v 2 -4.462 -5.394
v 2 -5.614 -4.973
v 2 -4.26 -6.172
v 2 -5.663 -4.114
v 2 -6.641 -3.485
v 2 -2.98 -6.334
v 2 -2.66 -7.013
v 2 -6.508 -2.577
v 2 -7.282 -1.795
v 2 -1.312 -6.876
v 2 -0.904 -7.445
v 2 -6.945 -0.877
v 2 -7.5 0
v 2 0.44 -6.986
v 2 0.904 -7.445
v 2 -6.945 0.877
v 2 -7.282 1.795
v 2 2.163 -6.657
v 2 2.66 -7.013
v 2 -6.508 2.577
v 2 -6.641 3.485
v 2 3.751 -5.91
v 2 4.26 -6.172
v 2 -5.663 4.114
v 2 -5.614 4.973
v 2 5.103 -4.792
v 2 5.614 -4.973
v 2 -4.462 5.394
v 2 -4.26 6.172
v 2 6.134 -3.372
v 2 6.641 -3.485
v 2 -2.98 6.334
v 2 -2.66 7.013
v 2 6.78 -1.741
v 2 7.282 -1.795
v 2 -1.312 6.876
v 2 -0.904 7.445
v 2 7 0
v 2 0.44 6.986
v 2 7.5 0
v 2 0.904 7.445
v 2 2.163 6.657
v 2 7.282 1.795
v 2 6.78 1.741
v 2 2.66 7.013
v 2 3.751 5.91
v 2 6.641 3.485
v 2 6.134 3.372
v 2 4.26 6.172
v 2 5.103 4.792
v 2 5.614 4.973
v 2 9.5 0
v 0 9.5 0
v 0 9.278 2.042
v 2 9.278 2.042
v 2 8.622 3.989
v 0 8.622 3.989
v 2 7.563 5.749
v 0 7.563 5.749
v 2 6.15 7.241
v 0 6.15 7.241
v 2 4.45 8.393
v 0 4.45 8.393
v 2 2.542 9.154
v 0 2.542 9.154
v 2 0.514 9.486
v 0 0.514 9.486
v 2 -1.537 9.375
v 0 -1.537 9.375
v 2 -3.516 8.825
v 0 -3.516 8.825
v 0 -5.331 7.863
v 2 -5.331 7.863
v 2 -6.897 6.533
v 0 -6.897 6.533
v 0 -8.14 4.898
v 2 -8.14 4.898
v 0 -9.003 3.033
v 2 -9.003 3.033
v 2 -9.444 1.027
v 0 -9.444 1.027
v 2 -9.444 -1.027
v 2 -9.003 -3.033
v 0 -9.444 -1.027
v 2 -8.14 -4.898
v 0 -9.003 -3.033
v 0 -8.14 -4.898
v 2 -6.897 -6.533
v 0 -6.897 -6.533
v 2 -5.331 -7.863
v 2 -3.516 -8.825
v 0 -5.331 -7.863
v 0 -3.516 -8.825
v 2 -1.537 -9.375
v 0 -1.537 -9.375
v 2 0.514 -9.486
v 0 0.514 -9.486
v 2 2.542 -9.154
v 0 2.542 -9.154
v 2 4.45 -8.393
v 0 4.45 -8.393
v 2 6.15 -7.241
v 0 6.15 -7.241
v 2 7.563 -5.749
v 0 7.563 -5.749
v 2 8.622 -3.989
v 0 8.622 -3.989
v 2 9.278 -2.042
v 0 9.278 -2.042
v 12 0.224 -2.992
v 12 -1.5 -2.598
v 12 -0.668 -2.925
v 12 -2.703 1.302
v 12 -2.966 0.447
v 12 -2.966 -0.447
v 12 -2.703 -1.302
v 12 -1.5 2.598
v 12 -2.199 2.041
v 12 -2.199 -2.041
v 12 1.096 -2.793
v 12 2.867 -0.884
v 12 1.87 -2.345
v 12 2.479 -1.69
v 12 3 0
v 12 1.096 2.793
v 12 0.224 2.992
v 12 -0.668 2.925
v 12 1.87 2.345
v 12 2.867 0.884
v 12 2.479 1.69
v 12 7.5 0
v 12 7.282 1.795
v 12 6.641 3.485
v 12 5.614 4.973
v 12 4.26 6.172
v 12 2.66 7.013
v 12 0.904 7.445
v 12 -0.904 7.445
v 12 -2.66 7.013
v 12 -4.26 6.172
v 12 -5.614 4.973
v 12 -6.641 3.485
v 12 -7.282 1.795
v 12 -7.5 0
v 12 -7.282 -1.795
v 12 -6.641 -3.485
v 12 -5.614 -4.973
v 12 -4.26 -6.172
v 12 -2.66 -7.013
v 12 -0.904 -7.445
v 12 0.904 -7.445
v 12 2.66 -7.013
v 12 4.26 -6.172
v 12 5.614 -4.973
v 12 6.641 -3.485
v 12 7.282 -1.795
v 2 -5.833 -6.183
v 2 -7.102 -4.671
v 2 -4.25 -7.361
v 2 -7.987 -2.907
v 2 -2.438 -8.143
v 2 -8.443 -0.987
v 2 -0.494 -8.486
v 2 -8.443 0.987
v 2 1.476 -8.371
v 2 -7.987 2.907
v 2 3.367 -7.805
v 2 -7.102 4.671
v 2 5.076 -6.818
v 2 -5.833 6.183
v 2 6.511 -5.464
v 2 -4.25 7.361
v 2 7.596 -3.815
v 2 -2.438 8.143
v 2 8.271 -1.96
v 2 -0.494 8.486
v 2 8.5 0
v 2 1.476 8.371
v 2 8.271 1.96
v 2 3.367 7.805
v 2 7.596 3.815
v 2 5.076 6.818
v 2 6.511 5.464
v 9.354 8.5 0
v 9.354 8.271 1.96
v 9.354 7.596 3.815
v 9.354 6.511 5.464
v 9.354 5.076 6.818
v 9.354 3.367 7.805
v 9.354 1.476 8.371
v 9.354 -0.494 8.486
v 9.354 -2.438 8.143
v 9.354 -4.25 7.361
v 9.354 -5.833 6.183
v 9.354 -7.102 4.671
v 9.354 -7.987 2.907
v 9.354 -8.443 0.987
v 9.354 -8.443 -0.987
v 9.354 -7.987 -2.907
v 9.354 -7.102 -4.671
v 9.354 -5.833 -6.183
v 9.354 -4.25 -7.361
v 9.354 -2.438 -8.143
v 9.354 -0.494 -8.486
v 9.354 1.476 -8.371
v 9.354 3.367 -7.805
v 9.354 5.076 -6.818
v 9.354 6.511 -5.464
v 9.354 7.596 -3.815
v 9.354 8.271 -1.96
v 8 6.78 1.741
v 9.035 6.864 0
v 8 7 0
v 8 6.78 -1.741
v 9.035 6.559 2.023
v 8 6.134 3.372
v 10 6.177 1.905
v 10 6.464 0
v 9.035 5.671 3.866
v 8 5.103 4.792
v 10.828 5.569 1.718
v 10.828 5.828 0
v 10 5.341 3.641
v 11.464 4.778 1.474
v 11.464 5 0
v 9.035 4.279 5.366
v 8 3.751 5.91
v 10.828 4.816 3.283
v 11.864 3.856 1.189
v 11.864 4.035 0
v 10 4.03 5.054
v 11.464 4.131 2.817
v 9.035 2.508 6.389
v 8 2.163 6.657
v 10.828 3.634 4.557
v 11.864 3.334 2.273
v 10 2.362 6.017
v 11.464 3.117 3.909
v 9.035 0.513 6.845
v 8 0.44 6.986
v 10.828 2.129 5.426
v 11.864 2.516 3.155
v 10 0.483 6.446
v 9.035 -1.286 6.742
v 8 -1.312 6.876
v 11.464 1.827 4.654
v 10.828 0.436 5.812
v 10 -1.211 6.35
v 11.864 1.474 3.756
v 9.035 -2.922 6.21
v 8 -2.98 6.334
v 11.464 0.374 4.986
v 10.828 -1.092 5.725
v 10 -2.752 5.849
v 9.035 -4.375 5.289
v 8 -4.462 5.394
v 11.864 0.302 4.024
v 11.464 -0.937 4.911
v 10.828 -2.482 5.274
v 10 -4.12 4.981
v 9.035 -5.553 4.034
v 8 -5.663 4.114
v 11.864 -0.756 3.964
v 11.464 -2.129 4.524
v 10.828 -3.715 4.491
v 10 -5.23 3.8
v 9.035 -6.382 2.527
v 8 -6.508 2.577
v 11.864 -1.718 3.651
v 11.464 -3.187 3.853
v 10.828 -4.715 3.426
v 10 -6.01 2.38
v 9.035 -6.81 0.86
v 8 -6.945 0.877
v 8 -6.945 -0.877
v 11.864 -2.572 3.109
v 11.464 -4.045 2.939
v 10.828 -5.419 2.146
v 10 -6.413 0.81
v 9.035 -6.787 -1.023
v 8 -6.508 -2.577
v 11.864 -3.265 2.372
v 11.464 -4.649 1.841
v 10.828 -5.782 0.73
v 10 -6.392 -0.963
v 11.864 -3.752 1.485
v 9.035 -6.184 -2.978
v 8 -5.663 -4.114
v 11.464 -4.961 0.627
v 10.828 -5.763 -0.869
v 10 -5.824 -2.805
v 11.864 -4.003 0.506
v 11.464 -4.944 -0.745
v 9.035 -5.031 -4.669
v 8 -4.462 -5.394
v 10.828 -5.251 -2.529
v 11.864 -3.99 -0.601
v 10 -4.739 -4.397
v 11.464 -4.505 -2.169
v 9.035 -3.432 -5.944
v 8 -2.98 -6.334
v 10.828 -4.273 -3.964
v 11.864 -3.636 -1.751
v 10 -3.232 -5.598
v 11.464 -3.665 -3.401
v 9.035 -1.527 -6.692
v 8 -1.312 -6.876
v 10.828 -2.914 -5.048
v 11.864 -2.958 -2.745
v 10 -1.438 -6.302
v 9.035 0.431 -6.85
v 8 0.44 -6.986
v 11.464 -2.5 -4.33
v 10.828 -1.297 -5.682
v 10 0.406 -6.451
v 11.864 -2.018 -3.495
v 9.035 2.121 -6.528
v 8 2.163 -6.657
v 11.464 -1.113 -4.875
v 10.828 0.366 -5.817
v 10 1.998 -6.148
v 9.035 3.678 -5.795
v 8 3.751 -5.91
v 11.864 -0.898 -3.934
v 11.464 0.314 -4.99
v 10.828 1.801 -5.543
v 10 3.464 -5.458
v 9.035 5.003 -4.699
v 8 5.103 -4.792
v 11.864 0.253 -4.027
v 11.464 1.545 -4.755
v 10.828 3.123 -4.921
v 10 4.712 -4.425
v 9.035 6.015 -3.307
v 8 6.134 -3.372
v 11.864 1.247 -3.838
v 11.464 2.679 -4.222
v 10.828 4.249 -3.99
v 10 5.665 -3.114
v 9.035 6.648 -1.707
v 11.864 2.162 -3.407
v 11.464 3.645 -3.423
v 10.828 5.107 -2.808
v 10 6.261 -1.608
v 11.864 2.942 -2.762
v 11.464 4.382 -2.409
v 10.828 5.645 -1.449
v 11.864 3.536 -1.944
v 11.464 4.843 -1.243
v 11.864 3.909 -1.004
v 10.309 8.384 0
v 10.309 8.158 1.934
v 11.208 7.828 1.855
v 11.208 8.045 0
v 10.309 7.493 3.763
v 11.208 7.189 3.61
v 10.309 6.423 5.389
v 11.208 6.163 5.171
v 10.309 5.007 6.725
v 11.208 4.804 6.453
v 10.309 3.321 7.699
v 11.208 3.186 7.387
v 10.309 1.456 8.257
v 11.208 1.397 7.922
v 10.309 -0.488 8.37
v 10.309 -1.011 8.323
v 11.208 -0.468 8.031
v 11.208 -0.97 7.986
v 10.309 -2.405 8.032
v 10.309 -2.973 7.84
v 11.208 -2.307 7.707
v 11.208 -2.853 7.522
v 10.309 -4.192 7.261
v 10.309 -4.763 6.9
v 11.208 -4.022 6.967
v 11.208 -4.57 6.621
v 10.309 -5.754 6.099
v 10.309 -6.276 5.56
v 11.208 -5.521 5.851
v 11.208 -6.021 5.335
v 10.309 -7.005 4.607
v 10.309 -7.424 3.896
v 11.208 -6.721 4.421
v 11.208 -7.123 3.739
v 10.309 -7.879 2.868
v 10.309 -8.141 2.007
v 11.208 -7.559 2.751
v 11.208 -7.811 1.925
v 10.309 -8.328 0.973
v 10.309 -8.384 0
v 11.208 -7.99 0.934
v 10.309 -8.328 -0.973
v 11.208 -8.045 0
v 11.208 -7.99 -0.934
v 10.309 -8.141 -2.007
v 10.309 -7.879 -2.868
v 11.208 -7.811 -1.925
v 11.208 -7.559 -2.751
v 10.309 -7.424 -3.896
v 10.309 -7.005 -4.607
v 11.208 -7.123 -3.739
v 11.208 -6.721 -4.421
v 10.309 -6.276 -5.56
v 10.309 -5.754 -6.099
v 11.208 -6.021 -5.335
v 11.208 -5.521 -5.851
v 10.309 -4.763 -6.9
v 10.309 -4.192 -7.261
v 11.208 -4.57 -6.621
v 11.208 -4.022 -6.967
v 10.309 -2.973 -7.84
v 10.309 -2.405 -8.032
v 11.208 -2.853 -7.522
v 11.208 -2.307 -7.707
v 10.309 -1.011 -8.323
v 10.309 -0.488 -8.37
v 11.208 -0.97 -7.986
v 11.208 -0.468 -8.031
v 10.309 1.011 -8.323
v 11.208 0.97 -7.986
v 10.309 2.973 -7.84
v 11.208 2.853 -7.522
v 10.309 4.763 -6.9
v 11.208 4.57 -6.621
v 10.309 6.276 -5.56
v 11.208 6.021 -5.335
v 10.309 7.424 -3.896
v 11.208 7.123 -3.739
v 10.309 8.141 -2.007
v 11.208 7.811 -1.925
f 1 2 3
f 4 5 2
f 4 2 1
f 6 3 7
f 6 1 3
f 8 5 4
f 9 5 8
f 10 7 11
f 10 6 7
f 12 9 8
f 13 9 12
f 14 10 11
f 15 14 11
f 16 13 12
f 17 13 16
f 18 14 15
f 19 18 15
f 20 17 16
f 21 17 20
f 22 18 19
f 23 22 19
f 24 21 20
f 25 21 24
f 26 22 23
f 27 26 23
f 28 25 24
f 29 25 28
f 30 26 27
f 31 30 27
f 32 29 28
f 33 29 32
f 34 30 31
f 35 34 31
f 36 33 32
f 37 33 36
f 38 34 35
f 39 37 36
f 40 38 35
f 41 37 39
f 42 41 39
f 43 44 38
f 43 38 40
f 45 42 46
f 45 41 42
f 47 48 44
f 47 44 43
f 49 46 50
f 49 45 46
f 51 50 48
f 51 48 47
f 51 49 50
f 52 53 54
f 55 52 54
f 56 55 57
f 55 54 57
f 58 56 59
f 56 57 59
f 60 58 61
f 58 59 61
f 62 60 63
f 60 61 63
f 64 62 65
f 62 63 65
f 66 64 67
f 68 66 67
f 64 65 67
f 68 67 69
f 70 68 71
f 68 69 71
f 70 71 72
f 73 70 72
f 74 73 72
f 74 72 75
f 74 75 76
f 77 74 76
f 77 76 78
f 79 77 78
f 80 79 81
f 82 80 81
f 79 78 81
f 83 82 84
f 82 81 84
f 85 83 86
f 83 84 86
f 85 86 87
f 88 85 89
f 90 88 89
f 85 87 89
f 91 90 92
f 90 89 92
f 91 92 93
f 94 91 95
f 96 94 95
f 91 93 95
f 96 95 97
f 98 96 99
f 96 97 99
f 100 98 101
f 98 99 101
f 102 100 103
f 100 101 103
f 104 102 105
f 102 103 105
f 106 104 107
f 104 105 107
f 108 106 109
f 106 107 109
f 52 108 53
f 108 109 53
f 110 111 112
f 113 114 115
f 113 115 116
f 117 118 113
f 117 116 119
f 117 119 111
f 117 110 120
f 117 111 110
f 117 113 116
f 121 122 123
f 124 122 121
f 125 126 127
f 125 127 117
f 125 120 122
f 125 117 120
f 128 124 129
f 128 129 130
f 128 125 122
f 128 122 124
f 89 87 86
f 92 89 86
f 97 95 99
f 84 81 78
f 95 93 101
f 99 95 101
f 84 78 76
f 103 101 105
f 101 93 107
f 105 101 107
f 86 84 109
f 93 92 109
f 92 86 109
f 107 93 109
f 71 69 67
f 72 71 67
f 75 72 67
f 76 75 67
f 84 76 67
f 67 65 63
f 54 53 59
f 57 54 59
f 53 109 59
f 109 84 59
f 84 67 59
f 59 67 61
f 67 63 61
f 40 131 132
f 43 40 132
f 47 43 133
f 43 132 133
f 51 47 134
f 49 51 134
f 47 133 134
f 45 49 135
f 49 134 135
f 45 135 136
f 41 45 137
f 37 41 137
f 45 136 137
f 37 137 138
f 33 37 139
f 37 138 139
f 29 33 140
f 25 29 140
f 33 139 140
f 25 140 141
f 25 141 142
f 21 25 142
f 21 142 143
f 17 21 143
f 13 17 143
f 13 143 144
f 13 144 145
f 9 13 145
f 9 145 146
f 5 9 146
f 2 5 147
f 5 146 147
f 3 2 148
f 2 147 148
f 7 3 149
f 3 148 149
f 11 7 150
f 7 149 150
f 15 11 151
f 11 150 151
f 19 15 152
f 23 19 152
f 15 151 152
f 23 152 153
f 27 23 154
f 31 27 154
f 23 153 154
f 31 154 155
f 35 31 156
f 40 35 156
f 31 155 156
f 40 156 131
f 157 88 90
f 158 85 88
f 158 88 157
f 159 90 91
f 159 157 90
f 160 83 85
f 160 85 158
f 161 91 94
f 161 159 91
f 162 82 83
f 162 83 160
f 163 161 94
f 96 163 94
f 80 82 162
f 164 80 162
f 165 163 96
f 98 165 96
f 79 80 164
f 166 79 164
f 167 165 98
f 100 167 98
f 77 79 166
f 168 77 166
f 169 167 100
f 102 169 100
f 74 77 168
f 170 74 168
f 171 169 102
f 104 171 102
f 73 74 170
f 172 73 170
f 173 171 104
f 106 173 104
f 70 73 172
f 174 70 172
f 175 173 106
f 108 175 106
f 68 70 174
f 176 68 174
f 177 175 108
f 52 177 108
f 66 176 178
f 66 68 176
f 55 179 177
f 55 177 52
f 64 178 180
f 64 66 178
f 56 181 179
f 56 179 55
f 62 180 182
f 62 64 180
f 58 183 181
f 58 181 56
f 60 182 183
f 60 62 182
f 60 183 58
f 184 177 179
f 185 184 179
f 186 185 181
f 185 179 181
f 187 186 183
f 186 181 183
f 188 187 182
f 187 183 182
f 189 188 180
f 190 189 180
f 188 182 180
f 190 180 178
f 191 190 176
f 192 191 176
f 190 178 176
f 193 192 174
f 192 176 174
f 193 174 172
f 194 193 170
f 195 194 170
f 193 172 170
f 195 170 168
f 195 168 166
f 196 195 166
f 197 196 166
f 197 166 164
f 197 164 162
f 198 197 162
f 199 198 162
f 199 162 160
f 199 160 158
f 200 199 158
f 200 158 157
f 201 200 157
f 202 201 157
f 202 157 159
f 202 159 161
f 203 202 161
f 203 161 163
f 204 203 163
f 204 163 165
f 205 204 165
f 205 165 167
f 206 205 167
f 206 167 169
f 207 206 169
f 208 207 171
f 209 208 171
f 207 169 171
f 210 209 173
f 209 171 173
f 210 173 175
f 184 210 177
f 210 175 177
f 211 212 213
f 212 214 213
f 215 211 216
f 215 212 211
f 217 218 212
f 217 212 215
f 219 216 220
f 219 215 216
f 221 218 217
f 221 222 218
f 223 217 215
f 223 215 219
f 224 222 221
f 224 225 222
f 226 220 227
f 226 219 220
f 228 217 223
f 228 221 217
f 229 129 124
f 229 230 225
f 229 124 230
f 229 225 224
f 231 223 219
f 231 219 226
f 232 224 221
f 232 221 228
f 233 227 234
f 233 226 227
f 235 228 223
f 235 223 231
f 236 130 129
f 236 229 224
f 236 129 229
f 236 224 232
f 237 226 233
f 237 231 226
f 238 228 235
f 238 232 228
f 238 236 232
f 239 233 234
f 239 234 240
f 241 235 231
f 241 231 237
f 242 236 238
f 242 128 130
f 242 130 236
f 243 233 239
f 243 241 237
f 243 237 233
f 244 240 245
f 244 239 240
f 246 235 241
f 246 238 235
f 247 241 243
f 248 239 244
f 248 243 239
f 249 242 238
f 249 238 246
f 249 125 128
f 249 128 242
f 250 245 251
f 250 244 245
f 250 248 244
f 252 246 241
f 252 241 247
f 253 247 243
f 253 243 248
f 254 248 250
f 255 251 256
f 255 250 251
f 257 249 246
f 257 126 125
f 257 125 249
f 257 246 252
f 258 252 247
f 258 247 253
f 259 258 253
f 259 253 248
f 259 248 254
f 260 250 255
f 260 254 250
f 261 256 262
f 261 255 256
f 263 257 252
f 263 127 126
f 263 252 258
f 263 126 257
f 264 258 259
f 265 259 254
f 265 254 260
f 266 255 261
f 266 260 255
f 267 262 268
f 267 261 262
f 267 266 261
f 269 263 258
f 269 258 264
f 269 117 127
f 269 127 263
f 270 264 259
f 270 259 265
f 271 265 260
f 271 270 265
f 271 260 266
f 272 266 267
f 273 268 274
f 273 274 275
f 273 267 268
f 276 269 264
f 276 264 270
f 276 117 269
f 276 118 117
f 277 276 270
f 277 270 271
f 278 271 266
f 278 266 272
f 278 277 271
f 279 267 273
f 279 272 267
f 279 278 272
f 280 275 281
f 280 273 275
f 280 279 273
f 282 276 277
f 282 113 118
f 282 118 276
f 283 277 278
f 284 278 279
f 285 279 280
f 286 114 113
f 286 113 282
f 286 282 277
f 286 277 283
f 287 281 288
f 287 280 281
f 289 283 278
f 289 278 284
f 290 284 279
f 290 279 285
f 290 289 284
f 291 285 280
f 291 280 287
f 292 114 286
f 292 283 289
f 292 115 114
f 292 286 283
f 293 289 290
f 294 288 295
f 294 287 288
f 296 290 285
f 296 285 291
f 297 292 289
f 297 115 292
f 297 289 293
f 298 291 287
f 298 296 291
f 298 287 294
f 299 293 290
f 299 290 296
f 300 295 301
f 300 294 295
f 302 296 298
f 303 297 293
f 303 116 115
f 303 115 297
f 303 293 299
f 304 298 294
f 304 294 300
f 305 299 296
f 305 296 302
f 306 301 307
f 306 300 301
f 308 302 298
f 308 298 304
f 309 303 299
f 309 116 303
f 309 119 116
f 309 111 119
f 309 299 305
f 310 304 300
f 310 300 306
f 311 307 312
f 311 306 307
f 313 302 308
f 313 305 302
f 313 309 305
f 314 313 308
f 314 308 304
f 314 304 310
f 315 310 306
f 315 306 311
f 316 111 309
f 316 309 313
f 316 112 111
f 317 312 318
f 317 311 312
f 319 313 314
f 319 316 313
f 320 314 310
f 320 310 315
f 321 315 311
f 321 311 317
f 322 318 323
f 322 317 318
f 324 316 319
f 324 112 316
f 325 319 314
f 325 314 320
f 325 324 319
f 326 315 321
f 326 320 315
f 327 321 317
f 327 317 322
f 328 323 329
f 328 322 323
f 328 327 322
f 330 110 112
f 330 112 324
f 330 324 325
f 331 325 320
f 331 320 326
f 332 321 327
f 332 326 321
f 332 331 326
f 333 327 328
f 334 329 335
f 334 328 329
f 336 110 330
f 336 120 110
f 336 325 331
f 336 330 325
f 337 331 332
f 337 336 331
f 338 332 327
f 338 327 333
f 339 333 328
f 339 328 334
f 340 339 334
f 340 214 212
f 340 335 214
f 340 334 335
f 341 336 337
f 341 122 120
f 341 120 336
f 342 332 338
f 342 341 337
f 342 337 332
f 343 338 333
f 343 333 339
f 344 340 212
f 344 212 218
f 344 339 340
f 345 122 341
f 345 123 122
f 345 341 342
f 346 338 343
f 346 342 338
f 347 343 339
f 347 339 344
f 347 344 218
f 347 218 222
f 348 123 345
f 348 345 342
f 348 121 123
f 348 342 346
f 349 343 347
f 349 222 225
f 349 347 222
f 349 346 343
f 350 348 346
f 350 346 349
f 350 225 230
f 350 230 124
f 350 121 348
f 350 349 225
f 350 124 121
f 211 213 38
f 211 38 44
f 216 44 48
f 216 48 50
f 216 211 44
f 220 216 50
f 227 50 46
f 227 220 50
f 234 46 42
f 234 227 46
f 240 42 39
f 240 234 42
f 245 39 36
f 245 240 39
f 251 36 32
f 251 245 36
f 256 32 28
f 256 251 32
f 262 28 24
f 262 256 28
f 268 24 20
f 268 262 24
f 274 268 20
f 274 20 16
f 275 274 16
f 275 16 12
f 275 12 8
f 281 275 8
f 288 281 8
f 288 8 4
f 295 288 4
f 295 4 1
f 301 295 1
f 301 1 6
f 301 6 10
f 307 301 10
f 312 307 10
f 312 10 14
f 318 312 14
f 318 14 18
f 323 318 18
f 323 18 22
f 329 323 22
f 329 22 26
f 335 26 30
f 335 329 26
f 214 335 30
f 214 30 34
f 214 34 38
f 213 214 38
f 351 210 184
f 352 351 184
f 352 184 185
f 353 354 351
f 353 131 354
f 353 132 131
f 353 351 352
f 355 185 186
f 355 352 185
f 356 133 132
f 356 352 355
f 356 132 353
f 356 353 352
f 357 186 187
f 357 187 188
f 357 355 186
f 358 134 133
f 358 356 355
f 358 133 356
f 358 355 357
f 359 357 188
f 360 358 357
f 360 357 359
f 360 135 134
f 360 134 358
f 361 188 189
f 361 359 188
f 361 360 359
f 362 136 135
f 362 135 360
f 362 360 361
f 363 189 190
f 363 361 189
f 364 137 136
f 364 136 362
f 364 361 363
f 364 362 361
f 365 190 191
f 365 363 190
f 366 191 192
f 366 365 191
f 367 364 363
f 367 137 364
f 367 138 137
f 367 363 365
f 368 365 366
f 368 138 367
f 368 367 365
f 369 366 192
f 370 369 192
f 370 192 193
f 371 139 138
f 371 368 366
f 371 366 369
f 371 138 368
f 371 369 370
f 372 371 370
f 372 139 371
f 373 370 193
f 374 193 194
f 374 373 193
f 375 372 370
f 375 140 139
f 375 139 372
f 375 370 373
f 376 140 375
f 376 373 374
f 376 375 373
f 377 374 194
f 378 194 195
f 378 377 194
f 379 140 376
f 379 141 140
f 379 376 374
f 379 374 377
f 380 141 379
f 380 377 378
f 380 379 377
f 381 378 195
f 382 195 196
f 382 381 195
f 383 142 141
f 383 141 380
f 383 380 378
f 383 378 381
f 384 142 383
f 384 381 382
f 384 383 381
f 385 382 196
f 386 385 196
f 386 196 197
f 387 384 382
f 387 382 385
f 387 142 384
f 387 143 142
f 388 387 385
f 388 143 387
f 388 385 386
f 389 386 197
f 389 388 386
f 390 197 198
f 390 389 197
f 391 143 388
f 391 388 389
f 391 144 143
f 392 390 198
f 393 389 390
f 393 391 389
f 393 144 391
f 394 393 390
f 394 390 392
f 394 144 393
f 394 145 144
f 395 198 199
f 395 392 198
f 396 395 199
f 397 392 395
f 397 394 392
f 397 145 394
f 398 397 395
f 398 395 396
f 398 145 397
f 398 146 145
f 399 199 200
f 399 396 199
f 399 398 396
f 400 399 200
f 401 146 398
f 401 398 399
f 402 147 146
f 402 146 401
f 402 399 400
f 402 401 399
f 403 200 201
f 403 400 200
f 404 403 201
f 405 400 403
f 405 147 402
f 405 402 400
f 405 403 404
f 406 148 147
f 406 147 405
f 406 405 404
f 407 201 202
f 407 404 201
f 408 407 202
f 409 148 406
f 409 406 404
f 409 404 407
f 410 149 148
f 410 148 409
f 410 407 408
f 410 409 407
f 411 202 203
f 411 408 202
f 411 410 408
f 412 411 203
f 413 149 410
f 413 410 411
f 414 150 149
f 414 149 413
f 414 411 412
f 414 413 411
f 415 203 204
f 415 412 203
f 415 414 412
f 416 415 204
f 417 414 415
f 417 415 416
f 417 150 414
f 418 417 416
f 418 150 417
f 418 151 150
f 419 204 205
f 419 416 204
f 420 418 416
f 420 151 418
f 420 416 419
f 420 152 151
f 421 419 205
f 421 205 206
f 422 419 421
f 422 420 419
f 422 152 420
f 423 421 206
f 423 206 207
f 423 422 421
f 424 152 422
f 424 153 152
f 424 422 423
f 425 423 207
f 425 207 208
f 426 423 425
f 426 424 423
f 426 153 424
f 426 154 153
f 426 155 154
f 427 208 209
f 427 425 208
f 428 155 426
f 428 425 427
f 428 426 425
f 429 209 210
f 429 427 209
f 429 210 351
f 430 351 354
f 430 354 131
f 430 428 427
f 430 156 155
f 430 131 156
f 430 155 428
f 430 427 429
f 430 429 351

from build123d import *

# Parameters (mm, degrees)
F0_R     = 9.5
F1_DEPTH = 2
F2_R     = 8.5
F3_DEPTH = 10
F4_R     = 7.5
F4_R_2   = 7
F5_DEPTH = 10


# Not quite as in the source:
# - a fillet or chamfer that OpenCascade refuses, or shapes differently, is made with other operations: its cross-section is extruded or revolved along the edge and cut away or added


with BuildPart() as f1:
    # F0 (on Right) → F1 (new body)
    with BuildSketch(Plane.YZ):
        Circle(F0_R)
    extrude(amount=F1_DEPTH)

    # F2 (on face) → F3 (join)
    with BuildSketch(Plane.YZ.offset(2)):
        Circle(F2_R)
    extrude(amount=F3_DEPTH)

    # F4 (on face) → F5 (cut)
    with BuildSketch(Plane.YZ.offset(12)):
        Circle(F4_R)
        Circle(F4_R_2, mode=Mode.SUBTRACT)
    extrude(amount=-F5_DEPTH, mode=Mode.SUBTRACT)

    # F6: fillet of radius 4 on 2 edges, made by hand

    # F6_s1 → F6_t2 (revolve, cut)
    with BuildSketch(Plane.XY):
        with BuildLine():
            ThreePointArc((8, 7), (10.8284271247, 5.8284271247), (12, 3))
            Line((12, 3), (12, 7))
            Line((12, 7), (8, 7))
        make_face()
    revolve(axis=Axis((12, 0, 0), (1, 0, 0)), mode=Mode.SUBTRACT)

    # F6_s3 → F6_t4 (revolve, cut)
    with BuildSketch(Plane.XY):
        with BuildLine():
            ThreePointArc((9.3542486889, 8.5), (10.7684622513, 8.2416573868), (12, 7.5))
            Line((12, 7.5), (12, 8.5))
            Line((12, 8.5), (9.3542486889, 8.5))
        make_face()
    revolve(axis=Axis((12, 0, 0), (1, 0, 0)), mode=Mode.SUBTRACT)


solid = f1.part
